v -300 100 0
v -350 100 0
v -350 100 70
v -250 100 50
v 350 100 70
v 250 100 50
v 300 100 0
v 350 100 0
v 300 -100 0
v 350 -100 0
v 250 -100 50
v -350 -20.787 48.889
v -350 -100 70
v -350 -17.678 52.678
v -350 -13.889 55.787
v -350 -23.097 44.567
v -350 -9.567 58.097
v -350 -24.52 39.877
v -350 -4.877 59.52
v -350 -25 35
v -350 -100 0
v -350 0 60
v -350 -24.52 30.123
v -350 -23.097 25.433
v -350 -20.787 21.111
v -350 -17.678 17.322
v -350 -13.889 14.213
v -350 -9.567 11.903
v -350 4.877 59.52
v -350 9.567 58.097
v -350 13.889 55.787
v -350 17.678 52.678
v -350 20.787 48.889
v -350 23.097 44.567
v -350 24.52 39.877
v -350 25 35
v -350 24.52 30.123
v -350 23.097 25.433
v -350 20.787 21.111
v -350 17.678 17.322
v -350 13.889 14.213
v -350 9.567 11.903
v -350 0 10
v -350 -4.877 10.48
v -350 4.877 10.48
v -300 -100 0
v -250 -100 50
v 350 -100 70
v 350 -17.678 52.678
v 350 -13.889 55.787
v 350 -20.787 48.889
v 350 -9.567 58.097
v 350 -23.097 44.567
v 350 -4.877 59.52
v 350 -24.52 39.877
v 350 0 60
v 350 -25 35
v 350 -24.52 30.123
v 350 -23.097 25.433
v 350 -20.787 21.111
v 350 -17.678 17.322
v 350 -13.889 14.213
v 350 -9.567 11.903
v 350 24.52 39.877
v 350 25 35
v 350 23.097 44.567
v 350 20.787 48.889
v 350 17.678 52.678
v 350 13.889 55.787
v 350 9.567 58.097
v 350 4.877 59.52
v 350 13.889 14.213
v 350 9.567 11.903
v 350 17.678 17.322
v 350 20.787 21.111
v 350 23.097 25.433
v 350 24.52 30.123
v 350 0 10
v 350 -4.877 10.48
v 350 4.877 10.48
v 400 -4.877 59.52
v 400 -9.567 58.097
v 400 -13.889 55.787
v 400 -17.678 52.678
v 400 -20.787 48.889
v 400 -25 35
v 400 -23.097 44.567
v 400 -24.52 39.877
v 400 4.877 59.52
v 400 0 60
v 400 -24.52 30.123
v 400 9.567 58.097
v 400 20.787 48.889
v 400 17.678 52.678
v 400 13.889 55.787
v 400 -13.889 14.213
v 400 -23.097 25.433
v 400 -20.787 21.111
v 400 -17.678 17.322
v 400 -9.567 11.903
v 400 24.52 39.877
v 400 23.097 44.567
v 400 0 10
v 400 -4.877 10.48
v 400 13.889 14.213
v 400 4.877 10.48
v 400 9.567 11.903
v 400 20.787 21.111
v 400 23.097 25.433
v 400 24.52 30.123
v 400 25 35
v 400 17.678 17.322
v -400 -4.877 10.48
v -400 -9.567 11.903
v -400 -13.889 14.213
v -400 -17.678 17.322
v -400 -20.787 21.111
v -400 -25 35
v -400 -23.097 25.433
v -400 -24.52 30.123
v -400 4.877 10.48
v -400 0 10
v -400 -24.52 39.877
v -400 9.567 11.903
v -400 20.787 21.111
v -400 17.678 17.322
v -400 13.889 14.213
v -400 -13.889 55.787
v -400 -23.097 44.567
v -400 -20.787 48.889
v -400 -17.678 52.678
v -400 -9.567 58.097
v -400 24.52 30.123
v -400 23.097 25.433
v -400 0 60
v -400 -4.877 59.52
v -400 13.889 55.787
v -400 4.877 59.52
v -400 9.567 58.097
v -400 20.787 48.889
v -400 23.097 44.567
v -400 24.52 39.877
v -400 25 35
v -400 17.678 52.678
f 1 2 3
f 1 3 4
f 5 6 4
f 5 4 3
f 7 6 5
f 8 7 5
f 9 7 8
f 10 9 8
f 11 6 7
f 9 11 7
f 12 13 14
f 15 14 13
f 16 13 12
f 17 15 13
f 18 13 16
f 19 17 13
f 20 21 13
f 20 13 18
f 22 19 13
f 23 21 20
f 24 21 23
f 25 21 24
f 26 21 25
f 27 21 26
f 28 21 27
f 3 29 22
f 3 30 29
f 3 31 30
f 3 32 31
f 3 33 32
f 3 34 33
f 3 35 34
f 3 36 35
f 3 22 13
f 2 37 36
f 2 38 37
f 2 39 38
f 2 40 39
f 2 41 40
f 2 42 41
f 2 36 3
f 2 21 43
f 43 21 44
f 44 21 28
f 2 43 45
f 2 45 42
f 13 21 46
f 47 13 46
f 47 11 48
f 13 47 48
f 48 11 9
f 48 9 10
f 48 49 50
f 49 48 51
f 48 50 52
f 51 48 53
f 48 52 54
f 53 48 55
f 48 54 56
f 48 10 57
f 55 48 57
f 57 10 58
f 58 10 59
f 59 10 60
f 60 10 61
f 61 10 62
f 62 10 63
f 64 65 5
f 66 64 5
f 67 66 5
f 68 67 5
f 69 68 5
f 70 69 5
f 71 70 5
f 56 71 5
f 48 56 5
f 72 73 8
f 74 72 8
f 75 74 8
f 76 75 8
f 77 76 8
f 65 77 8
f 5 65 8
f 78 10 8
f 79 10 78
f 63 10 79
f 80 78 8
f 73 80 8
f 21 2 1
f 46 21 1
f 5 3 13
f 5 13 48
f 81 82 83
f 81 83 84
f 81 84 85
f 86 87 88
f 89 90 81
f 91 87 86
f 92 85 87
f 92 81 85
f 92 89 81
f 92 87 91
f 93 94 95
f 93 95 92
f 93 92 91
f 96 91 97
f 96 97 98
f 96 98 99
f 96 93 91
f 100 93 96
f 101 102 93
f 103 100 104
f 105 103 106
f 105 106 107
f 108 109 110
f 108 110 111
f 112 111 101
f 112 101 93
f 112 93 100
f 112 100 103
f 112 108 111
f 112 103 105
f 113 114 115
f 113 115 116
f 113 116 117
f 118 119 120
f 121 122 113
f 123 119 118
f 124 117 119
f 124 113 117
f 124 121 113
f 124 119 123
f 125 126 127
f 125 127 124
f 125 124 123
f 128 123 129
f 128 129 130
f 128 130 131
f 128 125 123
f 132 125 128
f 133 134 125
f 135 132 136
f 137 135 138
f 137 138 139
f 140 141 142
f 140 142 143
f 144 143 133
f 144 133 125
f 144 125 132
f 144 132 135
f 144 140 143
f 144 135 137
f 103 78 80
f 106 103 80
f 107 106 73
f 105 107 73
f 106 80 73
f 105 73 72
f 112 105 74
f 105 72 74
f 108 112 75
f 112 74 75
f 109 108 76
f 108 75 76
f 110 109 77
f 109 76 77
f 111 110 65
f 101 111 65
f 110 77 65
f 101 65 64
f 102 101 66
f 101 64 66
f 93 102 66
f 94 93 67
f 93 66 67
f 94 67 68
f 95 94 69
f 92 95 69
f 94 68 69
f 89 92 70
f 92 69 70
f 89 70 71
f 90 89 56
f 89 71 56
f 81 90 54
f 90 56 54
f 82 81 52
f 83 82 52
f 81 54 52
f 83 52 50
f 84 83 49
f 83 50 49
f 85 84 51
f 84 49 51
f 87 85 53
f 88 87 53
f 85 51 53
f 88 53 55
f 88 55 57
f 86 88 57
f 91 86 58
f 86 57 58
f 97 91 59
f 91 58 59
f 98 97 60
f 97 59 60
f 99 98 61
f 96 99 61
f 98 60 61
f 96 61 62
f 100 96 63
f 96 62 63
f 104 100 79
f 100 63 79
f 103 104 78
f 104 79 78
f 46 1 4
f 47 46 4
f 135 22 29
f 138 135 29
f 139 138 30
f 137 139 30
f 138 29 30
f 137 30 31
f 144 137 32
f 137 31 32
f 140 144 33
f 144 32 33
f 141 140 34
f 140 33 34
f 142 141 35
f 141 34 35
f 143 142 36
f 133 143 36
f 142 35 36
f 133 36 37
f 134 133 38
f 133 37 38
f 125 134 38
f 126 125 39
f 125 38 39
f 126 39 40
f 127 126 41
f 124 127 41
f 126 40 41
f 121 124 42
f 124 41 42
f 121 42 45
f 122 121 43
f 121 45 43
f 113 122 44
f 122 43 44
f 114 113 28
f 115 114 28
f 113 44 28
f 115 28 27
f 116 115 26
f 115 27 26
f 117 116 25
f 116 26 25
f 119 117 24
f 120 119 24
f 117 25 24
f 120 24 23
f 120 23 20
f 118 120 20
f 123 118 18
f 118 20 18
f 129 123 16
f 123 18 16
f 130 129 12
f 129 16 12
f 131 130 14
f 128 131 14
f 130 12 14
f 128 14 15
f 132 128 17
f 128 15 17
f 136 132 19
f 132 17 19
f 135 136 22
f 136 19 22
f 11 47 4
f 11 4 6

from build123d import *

# Parameters (mm, degrees)
SKETCH1_W           = 700
SKETCH1_H           = 200
BOSS_EXTRUDE1_DEPTH = 70
CUT_EXTRUDE1_DEPTH  = 201
SKETCH3_R           = 25
BOSS_EXTRUDE2_DEPTH = 50
SKETCH4_R           = 25
BOSS_EXTRUDE3_DEPTH = 50


with BuildPart() as part:
    # Sketch1 → Boss-Extrude1 (new body)
    with BuildSketch(Plane.XY):
        Rectangle(SKETCH1_W, SKETCH1_H)
    extrude(amount=BOSS_EXTRUDE1_DEPTH)

    # Sketch2 → Cut-Extrude1 (cut, through all)
    with BuildSketch(Plane.XZ.offset(100)):
        Polygon((-300, 0), (-250, 50), (250, 50), (300, 0), align=None)
    extrude(amount=-CUT_EXTRUDE1_DEPTH, mode=Mode.SUBTRACT)

    # Sketch3 → Boss-Extrude2 (add)
    with BuildSketch(Plane.ZY.offset(350)):
        with Locations((35, 0)):
            Circle(SKETCH3_R)
    extrude(amount=BOSS_EXTRUDE2_DEPTH)

    # Sketch4 → Boss-Extrude3 (add)
    with BuildSketch(Plane(origin=(350, 0, 0), x_dir=(0, 0, -1), z_dir=(1, 0, 0))):
        with Locations((-35, 0)):
            Circle(SKETCH4_R)
    extrude(amount=BOSS_EXTRUDE3_DEPTH)


solid = part.part
